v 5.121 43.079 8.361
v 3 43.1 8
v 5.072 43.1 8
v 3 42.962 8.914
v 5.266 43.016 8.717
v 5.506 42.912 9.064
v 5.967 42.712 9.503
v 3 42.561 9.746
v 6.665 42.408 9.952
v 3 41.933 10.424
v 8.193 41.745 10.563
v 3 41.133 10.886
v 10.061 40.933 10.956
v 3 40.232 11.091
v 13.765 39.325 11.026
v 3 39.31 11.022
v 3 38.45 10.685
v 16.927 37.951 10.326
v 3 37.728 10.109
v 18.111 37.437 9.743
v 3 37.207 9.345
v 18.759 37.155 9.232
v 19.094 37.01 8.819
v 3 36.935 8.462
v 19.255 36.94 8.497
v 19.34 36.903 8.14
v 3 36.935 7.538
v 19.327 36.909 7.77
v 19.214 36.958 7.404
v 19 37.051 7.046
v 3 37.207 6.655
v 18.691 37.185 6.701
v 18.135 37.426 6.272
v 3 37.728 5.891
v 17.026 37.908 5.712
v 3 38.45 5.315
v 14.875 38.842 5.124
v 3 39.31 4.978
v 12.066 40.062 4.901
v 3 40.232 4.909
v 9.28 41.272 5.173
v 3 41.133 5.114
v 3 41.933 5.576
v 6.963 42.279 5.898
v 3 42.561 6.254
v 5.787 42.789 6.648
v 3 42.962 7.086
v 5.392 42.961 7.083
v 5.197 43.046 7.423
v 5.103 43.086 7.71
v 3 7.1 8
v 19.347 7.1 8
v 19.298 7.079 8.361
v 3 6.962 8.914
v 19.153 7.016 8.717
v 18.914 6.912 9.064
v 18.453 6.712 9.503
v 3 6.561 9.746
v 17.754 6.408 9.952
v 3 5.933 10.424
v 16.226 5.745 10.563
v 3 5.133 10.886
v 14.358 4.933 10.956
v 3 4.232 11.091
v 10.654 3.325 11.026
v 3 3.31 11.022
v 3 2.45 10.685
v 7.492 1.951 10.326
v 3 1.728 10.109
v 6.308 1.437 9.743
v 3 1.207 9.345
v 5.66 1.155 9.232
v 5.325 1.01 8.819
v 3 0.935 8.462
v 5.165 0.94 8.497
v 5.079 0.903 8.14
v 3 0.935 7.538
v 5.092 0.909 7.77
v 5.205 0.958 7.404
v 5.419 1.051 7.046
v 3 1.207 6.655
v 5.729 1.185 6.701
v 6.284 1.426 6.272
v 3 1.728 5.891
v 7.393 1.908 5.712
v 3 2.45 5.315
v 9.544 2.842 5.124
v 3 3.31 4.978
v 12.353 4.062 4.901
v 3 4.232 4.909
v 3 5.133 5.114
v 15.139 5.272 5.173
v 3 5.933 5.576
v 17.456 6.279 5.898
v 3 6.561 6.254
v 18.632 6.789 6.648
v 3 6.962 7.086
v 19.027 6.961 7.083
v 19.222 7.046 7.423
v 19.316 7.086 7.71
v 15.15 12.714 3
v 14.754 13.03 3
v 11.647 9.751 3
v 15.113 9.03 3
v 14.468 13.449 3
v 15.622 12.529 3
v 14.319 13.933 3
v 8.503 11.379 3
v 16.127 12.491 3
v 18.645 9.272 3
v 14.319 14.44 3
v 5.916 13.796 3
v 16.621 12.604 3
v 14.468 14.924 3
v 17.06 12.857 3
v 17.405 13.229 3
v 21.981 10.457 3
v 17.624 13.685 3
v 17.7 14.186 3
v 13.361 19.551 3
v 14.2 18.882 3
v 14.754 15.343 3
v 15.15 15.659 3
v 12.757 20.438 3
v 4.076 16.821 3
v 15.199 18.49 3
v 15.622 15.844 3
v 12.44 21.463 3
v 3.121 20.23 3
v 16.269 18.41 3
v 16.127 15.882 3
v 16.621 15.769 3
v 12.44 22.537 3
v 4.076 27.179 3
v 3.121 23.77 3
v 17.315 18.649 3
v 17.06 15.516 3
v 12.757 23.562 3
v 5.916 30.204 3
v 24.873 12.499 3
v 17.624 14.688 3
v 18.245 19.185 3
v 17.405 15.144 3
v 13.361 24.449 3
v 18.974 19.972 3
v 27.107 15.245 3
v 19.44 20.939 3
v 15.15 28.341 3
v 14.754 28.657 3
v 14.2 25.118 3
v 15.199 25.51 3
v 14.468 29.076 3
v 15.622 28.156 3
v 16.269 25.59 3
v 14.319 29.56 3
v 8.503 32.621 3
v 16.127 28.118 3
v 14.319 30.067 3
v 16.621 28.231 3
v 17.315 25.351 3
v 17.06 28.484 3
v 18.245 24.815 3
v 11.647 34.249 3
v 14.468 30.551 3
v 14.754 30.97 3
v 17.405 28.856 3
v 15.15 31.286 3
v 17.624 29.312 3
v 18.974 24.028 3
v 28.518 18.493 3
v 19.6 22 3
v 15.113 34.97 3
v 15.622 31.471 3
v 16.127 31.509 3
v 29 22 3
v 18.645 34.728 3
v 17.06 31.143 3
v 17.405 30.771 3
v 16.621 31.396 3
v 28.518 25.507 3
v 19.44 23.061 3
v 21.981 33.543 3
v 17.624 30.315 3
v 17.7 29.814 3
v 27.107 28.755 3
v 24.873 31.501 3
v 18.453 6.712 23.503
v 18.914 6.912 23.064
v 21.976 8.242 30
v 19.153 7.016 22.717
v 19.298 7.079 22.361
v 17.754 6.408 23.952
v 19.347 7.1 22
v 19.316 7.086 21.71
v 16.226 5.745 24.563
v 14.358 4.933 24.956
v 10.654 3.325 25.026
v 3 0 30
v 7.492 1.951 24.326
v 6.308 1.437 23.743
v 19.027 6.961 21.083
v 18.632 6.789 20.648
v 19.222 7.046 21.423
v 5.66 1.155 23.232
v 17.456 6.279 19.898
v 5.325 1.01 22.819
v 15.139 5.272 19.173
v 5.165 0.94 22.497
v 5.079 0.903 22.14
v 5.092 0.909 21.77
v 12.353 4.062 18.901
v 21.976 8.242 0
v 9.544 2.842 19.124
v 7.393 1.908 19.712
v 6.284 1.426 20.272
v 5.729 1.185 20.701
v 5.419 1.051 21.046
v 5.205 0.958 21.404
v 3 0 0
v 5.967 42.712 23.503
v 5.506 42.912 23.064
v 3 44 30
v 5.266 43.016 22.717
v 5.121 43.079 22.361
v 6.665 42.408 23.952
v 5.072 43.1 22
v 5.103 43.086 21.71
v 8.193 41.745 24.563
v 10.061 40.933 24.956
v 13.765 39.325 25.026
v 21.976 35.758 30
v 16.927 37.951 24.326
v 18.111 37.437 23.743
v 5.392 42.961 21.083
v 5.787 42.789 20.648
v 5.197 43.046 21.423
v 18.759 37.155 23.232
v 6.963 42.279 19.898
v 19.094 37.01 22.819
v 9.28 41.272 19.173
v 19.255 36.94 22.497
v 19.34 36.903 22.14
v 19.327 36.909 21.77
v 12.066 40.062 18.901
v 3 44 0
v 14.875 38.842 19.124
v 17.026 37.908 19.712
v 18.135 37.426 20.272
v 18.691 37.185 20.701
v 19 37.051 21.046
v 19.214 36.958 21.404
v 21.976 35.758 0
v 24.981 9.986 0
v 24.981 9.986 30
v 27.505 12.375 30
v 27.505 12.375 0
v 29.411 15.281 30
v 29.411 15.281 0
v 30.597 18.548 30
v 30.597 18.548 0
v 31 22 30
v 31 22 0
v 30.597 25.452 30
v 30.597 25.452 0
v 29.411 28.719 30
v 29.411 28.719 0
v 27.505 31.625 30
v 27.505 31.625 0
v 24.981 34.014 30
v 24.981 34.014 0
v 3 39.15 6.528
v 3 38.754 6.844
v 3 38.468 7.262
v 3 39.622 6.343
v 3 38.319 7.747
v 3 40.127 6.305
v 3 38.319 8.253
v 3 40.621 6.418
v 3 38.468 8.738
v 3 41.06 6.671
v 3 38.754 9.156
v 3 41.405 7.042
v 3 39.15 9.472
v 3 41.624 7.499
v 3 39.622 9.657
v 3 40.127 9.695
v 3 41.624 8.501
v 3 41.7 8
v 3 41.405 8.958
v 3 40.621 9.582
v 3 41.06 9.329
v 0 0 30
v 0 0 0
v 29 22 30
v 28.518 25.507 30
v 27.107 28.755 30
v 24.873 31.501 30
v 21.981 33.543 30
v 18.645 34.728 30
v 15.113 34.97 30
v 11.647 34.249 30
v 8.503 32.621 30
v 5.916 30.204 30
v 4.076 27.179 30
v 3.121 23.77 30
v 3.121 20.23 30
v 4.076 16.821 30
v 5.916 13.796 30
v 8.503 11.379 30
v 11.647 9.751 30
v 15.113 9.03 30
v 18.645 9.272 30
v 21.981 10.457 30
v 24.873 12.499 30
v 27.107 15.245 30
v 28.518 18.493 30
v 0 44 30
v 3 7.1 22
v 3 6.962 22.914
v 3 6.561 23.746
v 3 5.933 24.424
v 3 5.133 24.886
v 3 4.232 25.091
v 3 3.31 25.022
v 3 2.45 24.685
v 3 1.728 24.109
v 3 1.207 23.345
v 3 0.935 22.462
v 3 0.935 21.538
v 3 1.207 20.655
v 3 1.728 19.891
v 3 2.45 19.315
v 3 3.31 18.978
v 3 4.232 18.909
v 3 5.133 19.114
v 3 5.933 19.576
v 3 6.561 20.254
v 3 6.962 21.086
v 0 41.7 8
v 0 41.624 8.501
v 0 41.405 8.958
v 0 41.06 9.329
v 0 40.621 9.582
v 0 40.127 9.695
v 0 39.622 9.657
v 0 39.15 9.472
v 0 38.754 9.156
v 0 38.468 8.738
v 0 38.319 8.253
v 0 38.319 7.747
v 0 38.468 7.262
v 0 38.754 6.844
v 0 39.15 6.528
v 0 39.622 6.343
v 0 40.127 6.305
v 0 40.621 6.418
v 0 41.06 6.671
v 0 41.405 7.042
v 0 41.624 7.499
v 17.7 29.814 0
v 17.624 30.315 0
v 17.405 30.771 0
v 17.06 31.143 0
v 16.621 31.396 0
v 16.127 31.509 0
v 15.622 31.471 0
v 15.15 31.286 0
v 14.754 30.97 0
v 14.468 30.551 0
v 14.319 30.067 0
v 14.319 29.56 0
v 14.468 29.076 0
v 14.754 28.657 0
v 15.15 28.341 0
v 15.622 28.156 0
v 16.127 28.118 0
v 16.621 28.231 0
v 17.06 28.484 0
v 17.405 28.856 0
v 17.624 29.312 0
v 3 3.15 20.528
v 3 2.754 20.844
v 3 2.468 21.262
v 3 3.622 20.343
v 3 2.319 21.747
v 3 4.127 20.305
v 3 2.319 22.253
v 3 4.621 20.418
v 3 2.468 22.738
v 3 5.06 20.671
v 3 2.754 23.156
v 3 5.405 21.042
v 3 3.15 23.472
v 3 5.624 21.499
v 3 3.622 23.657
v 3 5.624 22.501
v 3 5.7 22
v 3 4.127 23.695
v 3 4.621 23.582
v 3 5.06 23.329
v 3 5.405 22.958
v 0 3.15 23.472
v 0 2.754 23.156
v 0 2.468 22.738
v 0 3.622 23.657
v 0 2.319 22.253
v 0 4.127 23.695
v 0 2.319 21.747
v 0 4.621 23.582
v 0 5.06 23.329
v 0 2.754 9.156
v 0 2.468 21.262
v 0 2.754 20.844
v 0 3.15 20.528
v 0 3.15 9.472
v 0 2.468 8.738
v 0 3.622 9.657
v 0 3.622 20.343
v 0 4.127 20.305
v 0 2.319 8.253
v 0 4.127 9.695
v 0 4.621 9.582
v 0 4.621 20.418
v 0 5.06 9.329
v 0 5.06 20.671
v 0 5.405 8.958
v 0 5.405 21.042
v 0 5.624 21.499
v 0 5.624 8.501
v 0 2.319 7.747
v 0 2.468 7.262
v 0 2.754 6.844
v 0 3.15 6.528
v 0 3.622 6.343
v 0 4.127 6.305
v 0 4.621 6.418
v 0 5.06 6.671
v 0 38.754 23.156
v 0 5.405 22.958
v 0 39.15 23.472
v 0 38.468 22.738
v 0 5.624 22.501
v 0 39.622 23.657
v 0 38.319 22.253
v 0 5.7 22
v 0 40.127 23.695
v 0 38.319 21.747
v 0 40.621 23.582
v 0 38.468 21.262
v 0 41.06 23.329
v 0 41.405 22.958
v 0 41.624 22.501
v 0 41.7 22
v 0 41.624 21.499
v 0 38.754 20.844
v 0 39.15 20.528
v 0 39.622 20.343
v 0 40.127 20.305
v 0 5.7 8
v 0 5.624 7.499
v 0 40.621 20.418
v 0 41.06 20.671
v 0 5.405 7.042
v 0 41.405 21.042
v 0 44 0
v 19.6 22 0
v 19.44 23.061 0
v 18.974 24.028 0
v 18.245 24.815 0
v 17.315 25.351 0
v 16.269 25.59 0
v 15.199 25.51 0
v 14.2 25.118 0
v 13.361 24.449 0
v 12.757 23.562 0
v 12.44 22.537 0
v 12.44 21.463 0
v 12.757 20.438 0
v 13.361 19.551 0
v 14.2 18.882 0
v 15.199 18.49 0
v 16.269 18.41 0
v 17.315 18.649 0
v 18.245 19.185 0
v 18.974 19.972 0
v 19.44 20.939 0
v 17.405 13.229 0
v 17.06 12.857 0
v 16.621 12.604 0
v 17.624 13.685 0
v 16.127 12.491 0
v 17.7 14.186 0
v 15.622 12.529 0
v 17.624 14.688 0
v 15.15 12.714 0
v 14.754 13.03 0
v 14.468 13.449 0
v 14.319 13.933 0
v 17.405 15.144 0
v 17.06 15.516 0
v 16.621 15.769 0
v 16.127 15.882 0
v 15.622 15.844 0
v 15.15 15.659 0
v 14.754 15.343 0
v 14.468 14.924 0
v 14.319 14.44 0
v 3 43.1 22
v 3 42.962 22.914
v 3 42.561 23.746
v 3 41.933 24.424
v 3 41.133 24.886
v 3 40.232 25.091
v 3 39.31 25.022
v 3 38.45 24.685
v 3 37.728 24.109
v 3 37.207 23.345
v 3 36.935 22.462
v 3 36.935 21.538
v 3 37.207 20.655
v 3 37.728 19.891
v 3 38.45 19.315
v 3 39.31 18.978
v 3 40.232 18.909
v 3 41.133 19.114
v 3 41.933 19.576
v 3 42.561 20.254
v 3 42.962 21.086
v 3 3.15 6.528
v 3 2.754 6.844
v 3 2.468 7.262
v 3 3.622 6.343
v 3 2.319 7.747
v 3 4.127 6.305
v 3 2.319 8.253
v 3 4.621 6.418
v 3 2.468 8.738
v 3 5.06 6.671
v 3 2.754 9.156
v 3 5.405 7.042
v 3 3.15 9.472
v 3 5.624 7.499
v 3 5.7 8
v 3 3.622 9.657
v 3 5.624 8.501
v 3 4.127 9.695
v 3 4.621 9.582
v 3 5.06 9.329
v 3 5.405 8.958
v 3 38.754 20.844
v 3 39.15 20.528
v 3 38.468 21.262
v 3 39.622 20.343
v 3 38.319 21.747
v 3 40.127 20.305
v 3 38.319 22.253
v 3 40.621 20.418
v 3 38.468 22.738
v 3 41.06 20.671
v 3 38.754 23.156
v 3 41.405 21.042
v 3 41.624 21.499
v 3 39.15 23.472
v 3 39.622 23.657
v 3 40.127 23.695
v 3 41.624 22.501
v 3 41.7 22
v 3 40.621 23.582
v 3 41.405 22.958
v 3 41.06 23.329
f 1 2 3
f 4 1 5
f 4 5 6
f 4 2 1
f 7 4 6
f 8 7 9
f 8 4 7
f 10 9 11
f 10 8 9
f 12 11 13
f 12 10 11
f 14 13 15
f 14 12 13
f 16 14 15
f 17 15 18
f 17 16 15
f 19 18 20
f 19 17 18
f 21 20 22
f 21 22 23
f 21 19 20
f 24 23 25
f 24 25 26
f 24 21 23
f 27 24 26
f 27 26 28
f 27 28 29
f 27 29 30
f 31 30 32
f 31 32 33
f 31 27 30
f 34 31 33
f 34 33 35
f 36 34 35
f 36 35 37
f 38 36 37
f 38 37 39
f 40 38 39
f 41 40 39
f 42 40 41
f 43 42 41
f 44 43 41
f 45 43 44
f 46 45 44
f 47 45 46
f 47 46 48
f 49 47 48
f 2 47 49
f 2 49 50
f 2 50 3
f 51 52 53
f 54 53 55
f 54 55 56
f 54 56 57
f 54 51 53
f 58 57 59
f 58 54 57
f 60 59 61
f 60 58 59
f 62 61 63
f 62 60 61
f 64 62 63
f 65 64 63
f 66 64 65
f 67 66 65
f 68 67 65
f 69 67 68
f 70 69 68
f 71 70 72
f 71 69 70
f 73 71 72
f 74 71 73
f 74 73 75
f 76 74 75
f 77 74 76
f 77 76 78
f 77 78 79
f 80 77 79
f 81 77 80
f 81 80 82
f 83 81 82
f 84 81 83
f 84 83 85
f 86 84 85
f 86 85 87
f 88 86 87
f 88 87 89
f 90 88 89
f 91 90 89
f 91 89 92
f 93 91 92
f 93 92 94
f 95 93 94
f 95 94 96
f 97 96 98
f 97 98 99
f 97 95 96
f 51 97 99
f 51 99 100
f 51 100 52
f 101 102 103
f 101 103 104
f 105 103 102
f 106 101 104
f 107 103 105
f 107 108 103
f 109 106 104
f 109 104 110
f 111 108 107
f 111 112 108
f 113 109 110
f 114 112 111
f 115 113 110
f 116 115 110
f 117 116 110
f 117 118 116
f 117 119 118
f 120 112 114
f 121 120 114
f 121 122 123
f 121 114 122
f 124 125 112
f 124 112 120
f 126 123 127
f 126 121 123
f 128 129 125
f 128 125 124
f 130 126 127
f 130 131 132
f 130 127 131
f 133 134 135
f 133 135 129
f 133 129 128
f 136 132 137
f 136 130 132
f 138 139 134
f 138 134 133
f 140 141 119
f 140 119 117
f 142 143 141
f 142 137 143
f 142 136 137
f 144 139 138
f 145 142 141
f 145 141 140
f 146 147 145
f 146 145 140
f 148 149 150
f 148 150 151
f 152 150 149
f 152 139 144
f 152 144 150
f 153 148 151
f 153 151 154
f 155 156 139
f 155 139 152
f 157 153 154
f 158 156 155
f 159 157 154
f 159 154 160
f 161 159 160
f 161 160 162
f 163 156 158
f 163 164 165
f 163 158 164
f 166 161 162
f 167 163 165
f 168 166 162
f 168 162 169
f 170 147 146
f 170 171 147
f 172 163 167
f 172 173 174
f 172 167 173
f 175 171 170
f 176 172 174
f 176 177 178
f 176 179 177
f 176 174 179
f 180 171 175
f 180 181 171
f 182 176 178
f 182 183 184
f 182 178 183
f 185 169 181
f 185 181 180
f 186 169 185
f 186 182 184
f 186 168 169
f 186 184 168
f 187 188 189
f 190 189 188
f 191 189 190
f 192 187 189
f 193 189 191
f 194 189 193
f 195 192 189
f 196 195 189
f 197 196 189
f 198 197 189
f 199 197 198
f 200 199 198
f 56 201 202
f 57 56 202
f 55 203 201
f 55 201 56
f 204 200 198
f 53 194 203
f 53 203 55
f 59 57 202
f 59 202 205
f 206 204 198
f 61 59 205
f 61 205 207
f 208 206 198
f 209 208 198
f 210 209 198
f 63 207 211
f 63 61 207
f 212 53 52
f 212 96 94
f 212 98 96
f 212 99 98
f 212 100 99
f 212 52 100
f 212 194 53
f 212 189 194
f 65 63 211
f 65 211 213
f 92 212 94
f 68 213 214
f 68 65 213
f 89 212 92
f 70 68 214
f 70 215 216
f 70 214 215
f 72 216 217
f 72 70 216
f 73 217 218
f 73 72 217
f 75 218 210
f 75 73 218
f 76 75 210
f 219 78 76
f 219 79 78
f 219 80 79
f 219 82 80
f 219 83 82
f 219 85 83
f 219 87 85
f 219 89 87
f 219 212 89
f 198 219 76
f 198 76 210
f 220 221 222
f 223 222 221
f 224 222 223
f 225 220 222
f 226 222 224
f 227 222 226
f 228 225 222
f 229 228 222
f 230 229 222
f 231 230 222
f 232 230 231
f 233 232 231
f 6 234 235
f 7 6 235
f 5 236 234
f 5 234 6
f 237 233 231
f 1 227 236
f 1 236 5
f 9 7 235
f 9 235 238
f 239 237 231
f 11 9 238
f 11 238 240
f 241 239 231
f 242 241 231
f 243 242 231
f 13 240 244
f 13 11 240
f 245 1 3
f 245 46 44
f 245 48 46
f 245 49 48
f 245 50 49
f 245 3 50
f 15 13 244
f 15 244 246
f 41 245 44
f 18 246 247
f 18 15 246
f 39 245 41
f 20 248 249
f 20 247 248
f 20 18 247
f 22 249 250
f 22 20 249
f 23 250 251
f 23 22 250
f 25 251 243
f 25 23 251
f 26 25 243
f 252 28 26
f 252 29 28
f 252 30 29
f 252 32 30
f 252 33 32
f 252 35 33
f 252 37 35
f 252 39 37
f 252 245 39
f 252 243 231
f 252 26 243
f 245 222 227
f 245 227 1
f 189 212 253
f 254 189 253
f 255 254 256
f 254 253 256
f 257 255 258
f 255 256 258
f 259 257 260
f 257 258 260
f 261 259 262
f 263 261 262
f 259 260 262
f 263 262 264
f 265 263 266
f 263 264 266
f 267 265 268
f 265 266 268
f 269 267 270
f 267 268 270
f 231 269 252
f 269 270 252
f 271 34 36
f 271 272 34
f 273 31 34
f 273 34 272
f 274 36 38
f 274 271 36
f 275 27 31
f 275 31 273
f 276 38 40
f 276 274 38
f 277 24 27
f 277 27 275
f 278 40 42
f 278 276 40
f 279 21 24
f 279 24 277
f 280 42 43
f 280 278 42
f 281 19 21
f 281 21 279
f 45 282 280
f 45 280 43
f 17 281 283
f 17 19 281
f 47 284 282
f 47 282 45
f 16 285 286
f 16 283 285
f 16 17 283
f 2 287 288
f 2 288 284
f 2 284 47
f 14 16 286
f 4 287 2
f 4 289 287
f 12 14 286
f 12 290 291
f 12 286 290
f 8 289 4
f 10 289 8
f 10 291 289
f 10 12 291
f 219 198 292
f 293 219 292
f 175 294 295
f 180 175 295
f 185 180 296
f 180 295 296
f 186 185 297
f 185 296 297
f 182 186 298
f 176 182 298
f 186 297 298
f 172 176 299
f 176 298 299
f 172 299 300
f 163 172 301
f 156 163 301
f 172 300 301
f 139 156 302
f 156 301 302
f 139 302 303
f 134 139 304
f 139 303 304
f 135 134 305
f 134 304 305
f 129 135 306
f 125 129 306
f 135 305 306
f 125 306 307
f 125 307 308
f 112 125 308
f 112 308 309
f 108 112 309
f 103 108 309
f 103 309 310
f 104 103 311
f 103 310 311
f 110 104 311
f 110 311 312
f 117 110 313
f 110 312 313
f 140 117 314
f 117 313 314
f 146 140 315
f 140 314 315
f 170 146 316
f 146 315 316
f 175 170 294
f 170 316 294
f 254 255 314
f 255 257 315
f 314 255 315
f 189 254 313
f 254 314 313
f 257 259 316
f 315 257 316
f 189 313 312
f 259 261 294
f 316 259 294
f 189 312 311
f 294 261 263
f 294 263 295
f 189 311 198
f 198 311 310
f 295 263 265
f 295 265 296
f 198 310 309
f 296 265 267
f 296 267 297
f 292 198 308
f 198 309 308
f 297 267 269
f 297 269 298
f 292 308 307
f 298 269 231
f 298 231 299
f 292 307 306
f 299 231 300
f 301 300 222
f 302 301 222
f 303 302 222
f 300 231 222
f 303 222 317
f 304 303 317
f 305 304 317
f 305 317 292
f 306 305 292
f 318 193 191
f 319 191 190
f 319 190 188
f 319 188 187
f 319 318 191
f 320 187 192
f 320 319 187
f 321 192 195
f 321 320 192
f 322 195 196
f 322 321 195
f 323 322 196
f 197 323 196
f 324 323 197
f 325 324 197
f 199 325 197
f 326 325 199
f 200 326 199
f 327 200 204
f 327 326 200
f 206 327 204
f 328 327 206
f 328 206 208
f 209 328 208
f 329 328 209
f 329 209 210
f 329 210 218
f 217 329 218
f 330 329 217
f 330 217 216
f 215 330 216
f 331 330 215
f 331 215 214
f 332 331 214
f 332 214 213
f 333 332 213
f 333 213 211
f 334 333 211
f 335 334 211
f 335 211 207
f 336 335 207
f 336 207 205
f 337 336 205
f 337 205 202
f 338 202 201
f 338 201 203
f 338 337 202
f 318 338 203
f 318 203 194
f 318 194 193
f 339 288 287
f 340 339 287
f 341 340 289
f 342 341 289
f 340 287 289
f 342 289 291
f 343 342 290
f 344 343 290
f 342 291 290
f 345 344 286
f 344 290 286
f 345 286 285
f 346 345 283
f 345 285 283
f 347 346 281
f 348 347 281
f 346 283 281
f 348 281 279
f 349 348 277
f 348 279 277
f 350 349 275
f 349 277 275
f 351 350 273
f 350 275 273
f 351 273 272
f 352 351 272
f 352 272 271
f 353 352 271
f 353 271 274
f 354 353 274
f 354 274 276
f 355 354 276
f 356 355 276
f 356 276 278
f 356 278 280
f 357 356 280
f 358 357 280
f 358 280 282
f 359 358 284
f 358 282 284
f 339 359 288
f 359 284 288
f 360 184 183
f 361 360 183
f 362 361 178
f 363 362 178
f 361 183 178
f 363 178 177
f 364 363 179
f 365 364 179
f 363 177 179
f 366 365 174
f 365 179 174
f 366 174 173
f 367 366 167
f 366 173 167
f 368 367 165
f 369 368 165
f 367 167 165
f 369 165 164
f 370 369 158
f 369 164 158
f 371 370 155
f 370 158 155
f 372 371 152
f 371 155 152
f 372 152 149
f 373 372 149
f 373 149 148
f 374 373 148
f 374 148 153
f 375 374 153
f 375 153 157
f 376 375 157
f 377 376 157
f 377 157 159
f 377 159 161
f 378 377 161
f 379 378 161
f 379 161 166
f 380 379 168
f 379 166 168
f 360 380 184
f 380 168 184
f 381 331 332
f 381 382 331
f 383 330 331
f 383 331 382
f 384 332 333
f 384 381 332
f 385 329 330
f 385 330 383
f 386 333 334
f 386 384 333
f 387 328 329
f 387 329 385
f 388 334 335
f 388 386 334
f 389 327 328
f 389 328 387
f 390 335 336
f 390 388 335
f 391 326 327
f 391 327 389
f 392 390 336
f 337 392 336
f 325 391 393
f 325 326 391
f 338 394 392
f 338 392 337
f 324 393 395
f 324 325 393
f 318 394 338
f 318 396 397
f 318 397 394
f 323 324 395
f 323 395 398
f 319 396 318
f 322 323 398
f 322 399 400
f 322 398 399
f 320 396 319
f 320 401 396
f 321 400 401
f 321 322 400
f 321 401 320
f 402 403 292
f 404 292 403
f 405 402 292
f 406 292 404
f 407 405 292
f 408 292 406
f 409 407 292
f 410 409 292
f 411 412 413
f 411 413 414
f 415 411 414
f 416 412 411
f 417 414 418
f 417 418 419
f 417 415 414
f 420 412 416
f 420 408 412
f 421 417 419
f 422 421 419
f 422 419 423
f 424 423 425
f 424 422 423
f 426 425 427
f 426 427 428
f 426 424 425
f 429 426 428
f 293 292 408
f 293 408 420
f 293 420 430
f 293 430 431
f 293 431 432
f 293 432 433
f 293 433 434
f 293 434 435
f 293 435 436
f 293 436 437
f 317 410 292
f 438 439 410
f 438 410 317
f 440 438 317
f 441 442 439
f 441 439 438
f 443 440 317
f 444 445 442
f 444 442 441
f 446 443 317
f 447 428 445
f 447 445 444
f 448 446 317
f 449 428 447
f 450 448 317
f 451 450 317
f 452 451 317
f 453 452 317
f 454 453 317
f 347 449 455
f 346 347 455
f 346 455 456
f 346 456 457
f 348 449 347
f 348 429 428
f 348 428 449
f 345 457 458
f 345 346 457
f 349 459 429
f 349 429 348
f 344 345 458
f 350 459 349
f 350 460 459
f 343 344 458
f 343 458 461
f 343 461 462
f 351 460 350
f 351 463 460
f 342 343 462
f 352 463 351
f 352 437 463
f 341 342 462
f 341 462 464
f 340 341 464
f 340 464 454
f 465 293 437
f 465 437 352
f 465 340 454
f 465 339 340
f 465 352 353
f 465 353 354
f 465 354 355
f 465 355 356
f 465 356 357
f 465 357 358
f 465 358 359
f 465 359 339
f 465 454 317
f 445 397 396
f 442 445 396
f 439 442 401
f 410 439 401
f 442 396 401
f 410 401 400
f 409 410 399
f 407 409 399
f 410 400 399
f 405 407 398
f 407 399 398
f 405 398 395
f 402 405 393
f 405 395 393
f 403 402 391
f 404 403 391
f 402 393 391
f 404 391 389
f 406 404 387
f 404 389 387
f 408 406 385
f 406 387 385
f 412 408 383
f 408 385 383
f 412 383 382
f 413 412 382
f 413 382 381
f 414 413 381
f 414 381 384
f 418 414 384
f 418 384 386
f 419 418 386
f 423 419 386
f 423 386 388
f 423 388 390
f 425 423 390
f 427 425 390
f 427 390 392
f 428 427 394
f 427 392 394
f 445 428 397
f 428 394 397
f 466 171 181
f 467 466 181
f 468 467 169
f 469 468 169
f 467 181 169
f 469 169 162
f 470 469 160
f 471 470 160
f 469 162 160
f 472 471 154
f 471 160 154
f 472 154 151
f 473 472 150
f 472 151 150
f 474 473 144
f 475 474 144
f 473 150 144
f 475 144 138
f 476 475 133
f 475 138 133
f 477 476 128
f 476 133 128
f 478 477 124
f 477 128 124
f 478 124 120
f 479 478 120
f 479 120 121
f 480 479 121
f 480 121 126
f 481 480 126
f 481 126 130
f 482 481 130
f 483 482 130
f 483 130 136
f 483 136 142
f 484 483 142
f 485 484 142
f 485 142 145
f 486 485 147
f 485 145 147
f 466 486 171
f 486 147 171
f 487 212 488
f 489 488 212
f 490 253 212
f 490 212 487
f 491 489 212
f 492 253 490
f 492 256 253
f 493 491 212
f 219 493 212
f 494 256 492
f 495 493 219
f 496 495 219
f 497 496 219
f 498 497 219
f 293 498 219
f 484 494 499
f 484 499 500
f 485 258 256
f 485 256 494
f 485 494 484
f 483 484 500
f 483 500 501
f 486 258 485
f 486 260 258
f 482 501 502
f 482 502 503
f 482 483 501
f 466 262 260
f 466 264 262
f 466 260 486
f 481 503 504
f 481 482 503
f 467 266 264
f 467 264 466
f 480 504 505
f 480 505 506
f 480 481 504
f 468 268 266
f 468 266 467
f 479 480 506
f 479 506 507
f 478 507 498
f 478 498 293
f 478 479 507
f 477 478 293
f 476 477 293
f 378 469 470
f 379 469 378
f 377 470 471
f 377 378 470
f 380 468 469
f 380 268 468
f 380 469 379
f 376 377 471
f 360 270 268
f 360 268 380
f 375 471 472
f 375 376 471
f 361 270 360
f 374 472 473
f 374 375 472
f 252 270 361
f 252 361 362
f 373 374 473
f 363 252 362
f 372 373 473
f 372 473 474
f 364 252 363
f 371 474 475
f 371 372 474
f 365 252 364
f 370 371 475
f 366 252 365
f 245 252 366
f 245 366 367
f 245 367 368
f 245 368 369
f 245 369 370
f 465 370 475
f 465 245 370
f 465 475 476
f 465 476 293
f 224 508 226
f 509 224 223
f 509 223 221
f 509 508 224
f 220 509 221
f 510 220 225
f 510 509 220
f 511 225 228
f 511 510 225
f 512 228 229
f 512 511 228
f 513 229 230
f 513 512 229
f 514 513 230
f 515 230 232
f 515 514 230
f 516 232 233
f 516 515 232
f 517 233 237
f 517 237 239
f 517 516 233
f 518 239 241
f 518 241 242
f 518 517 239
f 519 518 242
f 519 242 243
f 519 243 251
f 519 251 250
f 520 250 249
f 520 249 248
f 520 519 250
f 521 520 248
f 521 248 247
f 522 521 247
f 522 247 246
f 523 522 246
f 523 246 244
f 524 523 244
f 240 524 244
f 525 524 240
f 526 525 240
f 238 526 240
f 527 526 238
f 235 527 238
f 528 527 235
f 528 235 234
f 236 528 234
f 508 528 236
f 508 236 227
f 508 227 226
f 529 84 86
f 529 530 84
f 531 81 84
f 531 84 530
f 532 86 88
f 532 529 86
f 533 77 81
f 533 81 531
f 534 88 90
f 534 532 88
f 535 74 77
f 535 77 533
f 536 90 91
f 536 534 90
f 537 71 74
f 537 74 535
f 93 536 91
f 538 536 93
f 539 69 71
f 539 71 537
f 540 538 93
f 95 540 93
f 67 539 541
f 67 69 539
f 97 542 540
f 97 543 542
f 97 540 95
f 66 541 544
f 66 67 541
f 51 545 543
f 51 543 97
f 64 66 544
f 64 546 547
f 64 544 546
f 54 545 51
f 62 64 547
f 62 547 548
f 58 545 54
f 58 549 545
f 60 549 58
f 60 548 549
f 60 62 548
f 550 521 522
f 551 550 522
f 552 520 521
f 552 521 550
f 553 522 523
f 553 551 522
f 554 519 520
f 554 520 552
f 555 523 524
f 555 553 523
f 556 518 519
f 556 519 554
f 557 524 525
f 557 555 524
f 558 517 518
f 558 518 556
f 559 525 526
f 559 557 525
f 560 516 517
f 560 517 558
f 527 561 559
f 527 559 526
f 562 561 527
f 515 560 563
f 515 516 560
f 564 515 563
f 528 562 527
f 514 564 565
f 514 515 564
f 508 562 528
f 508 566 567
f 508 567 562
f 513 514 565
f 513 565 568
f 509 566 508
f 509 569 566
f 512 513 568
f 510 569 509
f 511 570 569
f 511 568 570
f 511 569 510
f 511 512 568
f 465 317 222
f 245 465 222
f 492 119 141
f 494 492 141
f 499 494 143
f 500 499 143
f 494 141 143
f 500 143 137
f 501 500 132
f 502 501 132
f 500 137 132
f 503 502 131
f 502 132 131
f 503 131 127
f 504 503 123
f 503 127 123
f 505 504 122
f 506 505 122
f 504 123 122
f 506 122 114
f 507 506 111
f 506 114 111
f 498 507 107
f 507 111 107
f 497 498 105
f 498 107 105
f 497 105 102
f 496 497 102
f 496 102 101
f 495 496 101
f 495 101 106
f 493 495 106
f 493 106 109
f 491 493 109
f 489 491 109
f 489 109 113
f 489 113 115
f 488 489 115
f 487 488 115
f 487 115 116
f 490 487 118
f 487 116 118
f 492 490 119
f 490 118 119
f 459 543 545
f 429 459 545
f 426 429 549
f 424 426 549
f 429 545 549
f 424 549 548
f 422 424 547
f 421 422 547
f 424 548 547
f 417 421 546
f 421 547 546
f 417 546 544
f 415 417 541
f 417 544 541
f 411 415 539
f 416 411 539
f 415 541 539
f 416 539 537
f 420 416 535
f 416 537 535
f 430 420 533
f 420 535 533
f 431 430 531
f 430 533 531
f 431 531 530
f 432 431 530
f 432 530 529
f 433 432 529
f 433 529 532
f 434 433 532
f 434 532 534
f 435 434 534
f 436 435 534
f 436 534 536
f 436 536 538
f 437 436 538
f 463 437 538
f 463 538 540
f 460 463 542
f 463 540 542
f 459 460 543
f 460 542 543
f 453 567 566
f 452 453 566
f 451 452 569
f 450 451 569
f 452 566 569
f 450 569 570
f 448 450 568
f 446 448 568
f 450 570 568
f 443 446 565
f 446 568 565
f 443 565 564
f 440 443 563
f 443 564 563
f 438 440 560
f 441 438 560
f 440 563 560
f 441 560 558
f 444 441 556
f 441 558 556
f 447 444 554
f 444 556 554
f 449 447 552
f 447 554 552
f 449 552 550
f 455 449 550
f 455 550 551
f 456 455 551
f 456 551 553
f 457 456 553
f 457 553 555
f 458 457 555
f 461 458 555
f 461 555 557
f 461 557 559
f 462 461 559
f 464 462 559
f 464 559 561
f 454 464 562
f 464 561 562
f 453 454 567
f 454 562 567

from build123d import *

# Parameters (mm, degrees)
SKETCH002_R     = 3.1
PAD001_DEPTH    = 20
PAD_DEPTH       = 30
SKETCH001_R     = 13
POCKET_DEPTH    = 27
SKETCH003_R     = 1.7
POCKET001_DEPTH = 3
SKETCH004_R     = 3.6
SKETCH004_R_2   = 1.7
POCKET002_DEPTH = 3


with BuildPart() as pad001:
    # Sketch002 → Pad001 (new body)
    with BuildSketch(Plane.YZ.offset(3)):
        with Locations((4, 22)):
            Circle(SKETCH002_R)
        with Locations((40, 22)):
            Circle(SKETCH002_R)
        with Locations((4, 8)):
            Circle(SKETCH002_R)
        with Locations((40, 8)):
            Circle(SKETCH002_R)
    extrude(amount=PAD001_DEPTH)


with BuildPart() as pocket002:
    # Sketch → Pad (new body)
    with BuildSketch(Plane.XY):
        with BuildLine():
            Line((0, 0), (0, 44))
            Line((0, 44), (3, 44))
            Line((3, 44), (21.975605, 35.758343))
            ThreePointArc((21.975609, 8.241648), (31, 21.999997), (21.975605, 35.758343))
            Line((21.975609, 8.241648), (3, 0))
            Line((3, 0), (0, 0))
        make_face()
    extrude(amount=PAD_DEPTH)

    # Sketch001 → Pocket (cut)
    with BuildSketch(Plane.XY.offset(30)):
        with Locations((16, 22)):
            Circle(SKETCH001_R)
    extrude(amount=-POCKET_DEPTH, mode=Mode.SUBTRACT)

    # Cut: cut Pad001
    add(pad001.part, mode=Mode.SUBTRACT)

    # Sketch003 → Pocket001 (cut)
    with BuildSketch(Plane.YZ.offset(3)):
        with Locations((4, 22)):
            Circle(SKETCH003_R)
        with Locations((40, 22)):
            Circle(SKETCH003_R)
        with Locations((4, 8)):
            Circle(SKETCH003_R)
        with Locations((40, 8)):
            Circle(SKETCH003_R)
    extrude(amount=-POCKET001_DEPTH, mode=Mode.SUBTRACT)

    # Sketch004 → Pocket002 (cut)
    with BuildSketch(Plane.XY.offset(3)):
        with Locations((16, 22)):
            Circle(SKETCH004_R)
        with Locations((16, 29.81356)):
            Circle(SKETCH004_R_2)
        with Locations((16, 14.18644)):
            Circle(SKETCH004_R_2)
    extrude(amount=-POCKET002_DEPTH, mode=Mode.SUBTRACT)


solid = pocket002.part
